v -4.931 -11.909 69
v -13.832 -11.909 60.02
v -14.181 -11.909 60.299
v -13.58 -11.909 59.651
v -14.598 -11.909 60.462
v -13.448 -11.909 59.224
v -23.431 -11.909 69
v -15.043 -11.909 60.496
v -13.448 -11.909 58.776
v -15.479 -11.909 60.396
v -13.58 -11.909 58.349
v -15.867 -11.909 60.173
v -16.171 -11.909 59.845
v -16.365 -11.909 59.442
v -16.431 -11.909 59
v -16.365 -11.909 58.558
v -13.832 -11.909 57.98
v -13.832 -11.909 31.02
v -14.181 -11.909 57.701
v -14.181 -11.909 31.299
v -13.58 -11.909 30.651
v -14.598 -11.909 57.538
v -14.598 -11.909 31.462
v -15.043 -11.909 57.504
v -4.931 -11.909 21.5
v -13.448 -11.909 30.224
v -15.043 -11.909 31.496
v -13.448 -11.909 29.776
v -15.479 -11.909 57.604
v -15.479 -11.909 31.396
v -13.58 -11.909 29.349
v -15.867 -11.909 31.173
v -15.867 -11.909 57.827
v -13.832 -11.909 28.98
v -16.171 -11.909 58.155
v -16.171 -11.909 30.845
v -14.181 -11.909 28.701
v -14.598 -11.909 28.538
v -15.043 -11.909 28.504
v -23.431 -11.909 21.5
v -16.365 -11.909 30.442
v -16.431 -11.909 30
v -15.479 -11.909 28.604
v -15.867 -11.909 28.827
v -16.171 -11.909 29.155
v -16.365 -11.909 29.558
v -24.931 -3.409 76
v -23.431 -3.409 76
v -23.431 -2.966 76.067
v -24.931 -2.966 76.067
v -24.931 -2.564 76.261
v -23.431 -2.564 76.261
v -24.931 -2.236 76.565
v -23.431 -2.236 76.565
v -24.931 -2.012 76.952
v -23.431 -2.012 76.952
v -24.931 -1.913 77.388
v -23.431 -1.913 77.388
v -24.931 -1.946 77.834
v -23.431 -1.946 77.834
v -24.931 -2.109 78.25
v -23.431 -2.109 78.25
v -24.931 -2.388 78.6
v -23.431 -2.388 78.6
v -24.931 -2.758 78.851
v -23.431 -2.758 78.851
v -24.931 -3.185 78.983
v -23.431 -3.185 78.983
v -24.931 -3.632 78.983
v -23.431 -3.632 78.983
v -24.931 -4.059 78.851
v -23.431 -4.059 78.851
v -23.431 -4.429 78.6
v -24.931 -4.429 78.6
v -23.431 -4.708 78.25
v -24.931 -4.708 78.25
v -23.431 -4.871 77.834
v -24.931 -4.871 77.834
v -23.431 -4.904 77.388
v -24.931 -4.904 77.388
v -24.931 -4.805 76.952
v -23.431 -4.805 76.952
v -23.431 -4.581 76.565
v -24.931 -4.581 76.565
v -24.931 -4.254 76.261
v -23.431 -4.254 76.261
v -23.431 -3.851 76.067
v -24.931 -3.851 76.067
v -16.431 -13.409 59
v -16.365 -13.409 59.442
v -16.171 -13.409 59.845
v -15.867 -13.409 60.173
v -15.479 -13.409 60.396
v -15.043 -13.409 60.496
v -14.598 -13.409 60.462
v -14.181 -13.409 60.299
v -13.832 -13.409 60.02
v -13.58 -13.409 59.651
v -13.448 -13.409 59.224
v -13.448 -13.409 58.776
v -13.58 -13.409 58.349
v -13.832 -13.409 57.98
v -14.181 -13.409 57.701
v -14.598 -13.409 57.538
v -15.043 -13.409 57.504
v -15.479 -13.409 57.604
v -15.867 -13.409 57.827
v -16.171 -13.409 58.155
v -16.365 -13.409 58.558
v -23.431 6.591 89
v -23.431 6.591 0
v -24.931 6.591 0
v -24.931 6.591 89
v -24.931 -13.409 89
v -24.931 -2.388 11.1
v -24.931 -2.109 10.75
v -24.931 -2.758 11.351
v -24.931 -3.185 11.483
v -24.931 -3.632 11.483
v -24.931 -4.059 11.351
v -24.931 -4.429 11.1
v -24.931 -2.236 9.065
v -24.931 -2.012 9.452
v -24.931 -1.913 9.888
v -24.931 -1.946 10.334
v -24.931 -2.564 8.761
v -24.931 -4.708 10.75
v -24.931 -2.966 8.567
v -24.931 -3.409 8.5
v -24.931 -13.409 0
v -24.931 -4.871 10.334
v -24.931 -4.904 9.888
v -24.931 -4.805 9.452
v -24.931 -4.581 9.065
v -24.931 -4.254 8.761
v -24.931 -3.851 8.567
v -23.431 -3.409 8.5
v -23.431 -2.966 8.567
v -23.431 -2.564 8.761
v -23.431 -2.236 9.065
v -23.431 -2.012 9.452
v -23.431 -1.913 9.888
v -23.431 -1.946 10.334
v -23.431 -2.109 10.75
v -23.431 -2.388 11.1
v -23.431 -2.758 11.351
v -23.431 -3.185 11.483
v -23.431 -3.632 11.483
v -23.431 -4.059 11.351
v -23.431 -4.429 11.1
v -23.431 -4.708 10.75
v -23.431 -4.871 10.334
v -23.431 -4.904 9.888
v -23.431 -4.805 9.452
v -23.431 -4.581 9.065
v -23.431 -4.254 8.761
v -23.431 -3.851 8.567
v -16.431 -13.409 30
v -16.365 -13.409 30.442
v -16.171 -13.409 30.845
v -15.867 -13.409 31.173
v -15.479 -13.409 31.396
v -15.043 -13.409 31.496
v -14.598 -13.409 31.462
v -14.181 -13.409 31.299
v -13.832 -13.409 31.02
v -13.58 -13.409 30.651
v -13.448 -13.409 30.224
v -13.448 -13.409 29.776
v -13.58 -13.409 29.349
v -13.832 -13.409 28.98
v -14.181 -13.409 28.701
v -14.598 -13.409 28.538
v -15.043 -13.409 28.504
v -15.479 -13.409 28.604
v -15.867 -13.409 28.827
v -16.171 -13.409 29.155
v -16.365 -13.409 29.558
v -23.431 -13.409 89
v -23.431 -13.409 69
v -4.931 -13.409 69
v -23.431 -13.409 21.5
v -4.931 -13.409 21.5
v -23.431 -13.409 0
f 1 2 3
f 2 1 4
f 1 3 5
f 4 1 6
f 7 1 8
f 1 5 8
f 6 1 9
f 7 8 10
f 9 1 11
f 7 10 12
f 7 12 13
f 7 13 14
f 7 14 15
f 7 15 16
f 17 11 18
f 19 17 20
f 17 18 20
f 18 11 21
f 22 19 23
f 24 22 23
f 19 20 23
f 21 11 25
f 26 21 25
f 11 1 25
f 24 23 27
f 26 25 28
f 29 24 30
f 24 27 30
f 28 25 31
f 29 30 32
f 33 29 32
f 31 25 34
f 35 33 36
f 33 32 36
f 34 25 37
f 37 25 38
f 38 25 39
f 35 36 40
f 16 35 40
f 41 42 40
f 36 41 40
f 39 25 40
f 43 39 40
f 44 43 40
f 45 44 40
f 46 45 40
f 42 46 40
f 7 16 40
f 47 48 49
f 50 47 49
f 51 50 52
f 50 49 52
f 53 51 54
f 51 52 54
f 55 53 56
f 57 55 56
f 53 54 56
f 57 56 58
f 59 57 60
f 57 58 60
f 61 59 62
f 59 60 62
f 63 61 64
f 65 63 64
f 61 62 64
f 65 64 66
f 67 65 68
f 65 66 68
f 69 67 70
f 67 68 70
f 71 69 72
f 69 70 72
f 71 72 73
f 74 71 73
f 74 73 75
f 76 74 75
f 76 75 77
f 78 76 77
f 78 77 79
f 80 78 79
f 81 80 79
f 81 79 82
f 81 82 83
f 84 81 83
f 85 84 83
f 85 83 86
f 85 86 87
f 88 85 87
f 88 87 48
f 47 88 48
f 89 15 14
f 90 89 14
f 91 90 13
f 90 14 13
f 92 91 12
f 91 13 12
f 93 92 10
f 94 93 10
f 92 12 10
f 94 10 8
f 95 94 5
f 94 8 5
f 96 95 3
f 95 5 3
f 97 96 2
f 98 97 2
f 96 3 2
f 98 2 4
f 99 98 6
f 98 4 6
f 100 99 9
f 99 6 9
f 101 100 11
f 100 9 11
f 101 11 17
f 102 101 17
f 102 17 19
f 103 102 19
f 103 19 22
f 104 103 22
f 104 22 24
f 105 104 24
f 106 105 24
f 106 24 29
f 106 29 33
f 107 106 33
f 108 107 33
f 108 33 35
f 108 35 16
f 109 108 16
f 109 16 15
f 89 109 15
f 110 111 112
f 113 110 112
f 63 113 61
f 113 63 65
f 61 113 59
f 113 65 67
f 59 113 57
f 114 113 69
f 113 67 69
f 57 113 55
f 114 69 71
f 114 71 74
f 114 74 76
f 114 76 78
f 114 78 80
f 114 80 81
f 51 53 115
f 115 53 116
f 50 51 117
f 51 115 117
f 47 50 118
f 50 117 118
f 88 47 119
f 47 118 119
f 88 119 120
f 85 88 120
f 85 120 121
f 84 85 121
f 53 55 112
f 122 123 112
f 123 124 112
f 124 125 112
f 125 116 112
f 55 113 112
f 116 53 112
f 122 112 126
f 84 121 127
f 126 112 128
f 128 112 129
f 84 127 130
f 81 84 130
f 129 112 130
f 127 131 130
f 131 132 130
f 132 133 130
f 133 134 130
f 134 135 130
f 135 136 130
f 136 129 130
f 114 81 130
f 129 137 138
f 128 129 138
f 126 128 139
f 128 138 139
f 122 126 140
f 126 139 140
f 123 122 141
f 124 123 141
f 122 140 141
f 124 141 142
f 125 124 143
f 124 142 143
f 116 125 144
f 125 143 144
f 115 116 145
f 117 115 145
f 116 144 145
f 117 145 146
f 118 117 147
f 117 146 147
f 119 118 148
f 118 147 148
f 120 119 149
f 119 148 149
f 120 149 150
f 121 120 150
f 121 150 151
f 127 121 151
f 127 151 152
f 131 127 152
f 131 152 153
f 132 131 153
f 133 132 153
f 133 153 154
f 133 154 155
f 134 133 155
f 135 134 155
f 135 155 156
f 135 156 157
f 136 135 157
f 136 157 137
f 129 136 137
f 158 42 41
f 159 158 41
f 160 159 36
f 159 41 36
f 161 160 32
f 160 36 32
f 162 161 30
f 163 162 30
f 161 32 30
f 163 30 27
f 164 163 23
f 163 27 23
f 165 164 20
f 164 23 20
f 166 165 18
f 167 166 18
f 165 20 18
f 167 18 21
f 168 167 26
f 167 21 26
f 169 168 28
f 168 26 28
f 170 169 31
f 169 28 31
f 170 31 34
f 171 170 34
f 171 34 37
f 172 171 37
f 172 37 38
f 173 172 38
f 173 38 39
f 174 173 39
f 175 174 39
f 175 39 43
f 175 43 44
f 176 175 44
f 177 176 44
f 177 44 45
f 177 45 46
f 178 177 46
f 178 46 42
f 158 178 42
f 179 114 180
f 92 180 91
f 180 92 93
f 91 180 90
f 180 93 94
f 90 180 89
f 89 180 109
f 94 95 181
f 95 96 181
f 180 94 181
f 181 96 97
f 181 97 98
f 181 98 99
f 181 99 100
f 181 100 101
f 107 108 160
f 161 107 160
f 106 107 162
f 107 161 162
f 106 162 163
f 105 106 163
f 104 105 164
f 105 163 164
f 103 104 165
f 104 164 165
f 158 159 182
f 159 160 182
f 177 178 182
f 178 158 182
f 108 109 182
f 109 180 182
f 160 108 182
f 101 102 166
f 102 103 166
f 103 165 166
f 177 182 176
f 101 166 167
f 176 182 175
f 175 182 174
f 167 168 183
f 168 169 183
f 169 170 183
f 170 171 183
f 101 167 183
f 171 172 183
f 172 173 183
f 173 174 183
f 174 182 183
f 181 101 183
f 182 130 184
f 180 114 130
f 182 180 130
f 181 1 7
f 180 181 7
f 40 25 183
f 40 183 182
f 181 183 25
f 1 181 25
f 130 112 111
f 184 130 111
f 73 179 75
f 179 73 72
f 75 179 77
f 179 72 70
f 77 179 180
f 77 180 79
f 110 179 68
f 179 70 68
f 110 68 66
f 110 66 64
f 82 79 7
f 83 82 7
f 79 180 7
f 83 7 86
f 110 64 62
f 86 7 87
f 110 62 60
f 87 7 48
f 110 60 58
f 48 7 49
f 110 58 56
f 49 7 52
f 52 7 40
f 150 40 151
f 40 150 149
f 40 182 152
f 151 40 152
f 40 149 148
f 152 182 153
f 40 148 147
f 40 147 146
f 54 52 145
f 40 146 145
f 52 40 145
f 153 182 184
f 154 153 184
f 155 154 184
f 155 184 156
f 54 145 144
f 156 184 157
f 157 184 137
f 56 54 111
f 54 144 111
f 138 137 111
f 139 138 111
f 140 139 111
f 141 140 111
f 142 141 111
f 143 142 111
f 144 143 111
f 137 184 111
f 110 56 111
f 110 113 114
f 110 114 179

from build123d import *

# Parameters (mm, degrees)
EXTRUSION1_DEPTH = 89
ESQUISSE2_R      = 1.5
ESQUISSE2_W      = 18.5
ESQUISSE2_H      = 20
ESQUISSE2_H_2    = 21.5
EXTRUSION2_DEPTH = 100
ESQUISSE3_R      = 1.5
EXTRUSION3_DEPTH = 100


with BuildPart() as part:
    # Esquisse1 → Extrusion1 (new body)
    with BuildSketch(Plane.XY):
        Polygon((-24.93137059, 6.591473684), (-24.93137059, -13.408526316), (-4.93137059, -13.408526316), (-4.93137059, -11.908526316), (-23.43137059, -11.908526316), (-23.43137059, 6.591473684), align=None)
    extrude(amount=EXTRUSION1_DEPTH)

    # Esquisse2 → Extrusion2 (cut)
    with BuildSketch(Plane(origin=(0, -11.908526316, 0), x_dir=(-1, 0, 0), z_dir=(0, 1, 0))):
        with Locations((14.93137059, 59)):
            Circle(ESQUISSE2_R)
        with Locations((14.93137059, 30)):
            Circle(ESQUISSE2_R)
        with Locations((14.18137059, 79)):
            Rectangle(ESQUISSE2_W, ESQUISSE2_H)
        with Locations((14.18137059, 10.75)):
            Rectangle(ESQUISSE2_W, ESQUISSE2_H_2)
    extrude(amount=-EXTRUSION2_DEPTH, mode=Mode.SUBTRACT)

    # Esquisse3 → Extrusion3 (cut)
    with BuildSketch(Plane(origin=(-23.43137059, 0, 0), x_dir=(0, 0, -1), z_dir=(1, 0, 0))):
        with Locations((-77.5, -3.408526316)):
            Circle(ESQUISSE3_R)
        with Locations((-10, -3.408526316)):
            Circle(ESQUISSE3_R)
    extrude(amount=-EXTRUSION3_DEPTH, mode=Mode.SUBTRACT)


solid = part.part
